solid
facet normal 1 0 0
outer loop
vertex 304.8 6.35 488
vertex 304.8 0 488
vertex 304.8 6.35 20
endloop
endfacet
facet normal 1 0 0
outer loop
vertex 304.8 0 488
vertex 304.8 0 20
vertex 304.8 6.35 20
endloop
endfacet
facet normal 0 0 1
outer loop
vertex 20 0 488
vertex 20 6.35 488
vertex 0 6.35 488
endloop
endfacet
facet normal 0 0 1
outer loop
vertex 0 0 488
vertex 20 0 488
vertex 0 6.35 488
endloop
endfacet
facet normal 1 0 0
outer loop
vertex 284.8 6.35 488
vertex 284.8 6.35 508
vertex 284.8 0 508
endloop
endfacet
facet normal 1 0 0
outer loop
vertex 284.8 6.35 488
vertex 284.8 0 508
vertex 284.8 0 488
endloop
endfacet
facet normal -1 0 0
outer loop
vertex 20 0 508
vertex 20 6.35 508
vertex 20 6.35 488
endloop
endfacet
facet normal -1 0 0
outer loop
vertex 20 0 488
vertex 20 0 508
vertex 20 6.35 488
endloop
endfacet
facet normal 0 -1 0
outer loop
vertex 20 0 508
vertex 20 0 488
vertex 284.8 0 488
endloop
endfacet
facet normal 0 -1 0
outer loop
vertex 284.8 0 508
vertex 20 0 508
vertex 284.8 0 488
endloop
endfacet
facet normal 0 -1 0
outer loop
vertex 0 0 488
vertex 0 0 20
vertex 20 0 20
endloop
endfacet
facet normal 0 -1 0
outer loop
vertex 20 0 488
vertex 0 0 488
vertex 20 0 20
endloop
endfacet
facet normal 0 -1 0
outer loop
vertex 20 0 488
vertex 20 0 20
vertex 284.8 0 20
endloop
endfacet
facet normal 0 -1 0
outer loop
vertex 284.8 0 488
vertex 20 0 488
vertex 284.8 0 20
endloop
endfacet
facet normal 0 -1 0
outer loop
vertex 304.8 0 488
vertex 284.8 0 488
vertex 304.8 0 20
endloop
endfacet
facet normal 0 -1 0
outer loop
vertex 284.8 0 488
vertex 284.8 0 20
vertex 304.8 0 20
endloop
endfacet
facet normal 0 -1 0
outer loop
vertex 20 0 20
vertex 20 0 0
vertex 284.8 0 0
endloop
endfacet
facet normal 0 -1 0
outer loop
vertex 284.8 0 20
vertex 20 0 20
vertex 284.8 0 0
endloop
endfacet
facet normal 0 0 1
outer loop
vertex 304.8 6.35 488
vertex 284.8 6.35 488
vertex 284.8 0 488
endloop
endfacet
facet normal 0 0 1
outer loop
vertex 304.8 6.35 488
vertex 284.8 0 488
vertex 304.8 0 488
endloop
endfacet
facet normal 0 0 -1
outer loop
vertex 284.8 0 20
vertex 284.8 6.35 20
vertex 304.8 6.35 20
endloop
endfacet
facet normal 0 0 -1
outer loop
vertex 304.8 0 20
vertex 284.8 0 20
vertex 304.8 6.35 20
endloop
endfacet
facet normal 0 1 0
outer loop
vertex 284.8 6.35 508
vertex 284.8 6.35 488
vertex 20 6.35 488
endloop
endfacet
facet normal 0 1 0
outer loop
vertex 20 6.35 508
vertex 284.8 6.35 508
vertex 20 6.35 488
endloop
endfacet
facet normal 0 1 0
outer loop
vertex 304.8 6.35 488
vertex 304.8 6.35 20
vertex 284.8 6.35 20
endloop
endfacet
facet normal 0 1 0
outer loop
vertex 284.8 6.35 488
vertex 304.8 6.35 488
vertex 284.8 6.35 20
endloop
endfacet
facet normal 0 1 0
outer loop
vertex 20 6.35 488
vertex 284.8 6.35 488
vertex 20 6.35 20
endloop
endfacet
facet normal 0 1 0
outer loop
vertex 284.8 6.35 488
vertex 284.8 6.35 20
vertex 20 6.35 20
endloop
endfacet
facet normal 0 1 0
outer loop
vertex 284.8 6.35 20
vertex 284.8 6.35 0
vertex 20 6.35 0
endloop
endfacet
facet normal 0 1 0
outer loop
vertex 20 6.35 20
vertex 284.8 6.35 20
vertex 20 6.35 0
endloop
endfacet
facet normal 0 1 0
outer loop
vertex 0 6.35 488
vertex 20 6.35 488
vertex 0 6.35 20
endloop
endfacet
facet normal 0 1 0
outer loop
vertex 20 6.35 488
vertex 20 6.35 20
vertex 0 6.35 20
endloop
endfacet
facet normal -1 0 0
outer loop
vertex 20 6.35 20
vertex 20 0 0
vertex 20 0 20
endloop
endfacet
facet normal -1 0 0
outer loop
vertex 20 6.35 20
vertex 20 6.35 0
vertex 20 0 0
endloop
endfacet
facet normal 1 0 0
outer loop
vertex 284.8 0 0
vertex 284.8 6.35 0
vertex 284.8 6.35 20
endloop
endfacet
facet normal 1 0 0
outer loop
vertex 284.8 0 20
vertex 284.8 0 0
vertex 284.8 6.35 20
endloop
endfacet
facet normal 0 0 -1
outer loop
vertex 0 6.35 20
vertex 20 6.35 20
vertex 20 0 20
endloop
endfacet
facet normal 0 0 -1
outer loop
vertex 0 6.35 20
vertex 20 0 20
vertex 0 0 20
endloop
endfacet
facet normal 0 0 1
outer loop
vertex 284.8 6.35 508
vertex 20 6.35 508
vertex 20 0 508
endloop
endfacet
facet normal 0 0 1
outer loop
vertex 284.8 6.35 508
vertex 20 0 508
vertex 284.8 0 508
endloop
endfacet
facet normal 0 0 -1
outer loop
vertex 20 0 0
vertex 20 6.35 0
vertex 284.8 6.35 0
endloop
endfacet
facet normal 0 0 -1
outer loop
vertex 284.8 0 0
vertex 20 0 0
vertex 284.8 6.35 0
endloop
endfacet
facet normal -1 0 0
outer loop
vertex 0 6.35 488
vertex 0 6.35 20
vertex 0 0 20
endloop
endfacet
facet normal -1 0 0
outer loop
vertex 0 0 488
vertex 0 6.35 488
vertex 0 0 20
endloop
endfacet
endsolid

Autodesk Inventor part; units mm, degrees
ref_plane "YZ Plane" through (0, 0, 0) normal (1, 0, 0) x (0, 1, 0)
ref_plane "XZ Plane" through (0, 0, 0) normal (0, 1, 0) x (-1, 0, 0)
ref_plane "XY Plane" through (0, 0, 0) normal (0, 0, 1) x (1, 0, 0)
sketch "Sketch1" plane through (0, 0, 0) normal (0, 0, 1) x (1, 0, 0)
  line L0 (0, 0) -> (304.8, 0)
  line L1 (304.8, 0) -> (304.8, 6.35)
  line L2 (304.8, 6.35) -> (0, 6.35)
  line L3 (0, 6.35) -> (0, 0)
  dimension "d0" = 304.8
  dimension "d1" = 6.35
extrude "Extrusion1" add sketch "Sketch1" along normal blind 508
sketch "Sketch2" plane through (0, 6.35, 0) normal (0, 1, 0) x (1, 0, 0)
  line L0 (304.8, 0) -> (0, 0) construction
  line L1 (152.4, 0) -> (152.4, -508) construction
  line L2 (304.8, -508) -> (0, -508) construction
  line L3 (0, 0) -> (0, -508) construction
  line L4 (0, -254) -> (304.8, -254) construction
  line L5 (304.8, 0) -> (304.8, -508) construction
  line L6 (0, 0) -> (0, -20)
  line L7 (0, -20) -> (20, -20) construction
  line L8 (20, -20) -> (0, -20)
  line L9 (0, -20) -> (0, 0)
  line L10 (0, 0) -> (20, 0)
  line L11 (20, 0) -> (20, -20)
  line L12 (304.8, 0) -> (304.8, -20)
  line L13 (304.8, -20) -> (284.8, -20) construction
  line L14 (284.8, -20) -> (304.8, -20)
  line L15 (304.8, -20) -> (304.8, 0)
  line L16 (304.8, 0) -> (284.8, 0)
  line L17 (284.8, 0) -> (284.8, -20)
  line L18 (304.8, -508) -> (0, -508) construction
  line L19 (0, -508) -> (0, -488)
  line L20 (0, -488) -> (20, -488) construction
  line L21 (20, -488) -> (0, -488)
  line L22 (0, -488) -> (0, -508)
  line L23 (0, -508) -> (20, -508)
  line L24 (20, -508) -> (20, -488)
  line L25 (304.8, -508) -> (304.8, -488)
  line L26 (304.8, -488) -> (284.8, -488) construction
  line L27 (284.8, -488) -> (304.8, -488)
  line L28 (304.8, -488) -> (304.8, -508)
  line L29 (304.8, -508) -> (284.8, -508)
  line L30 (284.8, -508) -> (284.8, -488)
  dimension "d4" = 20
  dimension "d5" = 20
extrude "Extrusion2" cut sketch "Sketch2" against normal through all
properties part number "Shee"
